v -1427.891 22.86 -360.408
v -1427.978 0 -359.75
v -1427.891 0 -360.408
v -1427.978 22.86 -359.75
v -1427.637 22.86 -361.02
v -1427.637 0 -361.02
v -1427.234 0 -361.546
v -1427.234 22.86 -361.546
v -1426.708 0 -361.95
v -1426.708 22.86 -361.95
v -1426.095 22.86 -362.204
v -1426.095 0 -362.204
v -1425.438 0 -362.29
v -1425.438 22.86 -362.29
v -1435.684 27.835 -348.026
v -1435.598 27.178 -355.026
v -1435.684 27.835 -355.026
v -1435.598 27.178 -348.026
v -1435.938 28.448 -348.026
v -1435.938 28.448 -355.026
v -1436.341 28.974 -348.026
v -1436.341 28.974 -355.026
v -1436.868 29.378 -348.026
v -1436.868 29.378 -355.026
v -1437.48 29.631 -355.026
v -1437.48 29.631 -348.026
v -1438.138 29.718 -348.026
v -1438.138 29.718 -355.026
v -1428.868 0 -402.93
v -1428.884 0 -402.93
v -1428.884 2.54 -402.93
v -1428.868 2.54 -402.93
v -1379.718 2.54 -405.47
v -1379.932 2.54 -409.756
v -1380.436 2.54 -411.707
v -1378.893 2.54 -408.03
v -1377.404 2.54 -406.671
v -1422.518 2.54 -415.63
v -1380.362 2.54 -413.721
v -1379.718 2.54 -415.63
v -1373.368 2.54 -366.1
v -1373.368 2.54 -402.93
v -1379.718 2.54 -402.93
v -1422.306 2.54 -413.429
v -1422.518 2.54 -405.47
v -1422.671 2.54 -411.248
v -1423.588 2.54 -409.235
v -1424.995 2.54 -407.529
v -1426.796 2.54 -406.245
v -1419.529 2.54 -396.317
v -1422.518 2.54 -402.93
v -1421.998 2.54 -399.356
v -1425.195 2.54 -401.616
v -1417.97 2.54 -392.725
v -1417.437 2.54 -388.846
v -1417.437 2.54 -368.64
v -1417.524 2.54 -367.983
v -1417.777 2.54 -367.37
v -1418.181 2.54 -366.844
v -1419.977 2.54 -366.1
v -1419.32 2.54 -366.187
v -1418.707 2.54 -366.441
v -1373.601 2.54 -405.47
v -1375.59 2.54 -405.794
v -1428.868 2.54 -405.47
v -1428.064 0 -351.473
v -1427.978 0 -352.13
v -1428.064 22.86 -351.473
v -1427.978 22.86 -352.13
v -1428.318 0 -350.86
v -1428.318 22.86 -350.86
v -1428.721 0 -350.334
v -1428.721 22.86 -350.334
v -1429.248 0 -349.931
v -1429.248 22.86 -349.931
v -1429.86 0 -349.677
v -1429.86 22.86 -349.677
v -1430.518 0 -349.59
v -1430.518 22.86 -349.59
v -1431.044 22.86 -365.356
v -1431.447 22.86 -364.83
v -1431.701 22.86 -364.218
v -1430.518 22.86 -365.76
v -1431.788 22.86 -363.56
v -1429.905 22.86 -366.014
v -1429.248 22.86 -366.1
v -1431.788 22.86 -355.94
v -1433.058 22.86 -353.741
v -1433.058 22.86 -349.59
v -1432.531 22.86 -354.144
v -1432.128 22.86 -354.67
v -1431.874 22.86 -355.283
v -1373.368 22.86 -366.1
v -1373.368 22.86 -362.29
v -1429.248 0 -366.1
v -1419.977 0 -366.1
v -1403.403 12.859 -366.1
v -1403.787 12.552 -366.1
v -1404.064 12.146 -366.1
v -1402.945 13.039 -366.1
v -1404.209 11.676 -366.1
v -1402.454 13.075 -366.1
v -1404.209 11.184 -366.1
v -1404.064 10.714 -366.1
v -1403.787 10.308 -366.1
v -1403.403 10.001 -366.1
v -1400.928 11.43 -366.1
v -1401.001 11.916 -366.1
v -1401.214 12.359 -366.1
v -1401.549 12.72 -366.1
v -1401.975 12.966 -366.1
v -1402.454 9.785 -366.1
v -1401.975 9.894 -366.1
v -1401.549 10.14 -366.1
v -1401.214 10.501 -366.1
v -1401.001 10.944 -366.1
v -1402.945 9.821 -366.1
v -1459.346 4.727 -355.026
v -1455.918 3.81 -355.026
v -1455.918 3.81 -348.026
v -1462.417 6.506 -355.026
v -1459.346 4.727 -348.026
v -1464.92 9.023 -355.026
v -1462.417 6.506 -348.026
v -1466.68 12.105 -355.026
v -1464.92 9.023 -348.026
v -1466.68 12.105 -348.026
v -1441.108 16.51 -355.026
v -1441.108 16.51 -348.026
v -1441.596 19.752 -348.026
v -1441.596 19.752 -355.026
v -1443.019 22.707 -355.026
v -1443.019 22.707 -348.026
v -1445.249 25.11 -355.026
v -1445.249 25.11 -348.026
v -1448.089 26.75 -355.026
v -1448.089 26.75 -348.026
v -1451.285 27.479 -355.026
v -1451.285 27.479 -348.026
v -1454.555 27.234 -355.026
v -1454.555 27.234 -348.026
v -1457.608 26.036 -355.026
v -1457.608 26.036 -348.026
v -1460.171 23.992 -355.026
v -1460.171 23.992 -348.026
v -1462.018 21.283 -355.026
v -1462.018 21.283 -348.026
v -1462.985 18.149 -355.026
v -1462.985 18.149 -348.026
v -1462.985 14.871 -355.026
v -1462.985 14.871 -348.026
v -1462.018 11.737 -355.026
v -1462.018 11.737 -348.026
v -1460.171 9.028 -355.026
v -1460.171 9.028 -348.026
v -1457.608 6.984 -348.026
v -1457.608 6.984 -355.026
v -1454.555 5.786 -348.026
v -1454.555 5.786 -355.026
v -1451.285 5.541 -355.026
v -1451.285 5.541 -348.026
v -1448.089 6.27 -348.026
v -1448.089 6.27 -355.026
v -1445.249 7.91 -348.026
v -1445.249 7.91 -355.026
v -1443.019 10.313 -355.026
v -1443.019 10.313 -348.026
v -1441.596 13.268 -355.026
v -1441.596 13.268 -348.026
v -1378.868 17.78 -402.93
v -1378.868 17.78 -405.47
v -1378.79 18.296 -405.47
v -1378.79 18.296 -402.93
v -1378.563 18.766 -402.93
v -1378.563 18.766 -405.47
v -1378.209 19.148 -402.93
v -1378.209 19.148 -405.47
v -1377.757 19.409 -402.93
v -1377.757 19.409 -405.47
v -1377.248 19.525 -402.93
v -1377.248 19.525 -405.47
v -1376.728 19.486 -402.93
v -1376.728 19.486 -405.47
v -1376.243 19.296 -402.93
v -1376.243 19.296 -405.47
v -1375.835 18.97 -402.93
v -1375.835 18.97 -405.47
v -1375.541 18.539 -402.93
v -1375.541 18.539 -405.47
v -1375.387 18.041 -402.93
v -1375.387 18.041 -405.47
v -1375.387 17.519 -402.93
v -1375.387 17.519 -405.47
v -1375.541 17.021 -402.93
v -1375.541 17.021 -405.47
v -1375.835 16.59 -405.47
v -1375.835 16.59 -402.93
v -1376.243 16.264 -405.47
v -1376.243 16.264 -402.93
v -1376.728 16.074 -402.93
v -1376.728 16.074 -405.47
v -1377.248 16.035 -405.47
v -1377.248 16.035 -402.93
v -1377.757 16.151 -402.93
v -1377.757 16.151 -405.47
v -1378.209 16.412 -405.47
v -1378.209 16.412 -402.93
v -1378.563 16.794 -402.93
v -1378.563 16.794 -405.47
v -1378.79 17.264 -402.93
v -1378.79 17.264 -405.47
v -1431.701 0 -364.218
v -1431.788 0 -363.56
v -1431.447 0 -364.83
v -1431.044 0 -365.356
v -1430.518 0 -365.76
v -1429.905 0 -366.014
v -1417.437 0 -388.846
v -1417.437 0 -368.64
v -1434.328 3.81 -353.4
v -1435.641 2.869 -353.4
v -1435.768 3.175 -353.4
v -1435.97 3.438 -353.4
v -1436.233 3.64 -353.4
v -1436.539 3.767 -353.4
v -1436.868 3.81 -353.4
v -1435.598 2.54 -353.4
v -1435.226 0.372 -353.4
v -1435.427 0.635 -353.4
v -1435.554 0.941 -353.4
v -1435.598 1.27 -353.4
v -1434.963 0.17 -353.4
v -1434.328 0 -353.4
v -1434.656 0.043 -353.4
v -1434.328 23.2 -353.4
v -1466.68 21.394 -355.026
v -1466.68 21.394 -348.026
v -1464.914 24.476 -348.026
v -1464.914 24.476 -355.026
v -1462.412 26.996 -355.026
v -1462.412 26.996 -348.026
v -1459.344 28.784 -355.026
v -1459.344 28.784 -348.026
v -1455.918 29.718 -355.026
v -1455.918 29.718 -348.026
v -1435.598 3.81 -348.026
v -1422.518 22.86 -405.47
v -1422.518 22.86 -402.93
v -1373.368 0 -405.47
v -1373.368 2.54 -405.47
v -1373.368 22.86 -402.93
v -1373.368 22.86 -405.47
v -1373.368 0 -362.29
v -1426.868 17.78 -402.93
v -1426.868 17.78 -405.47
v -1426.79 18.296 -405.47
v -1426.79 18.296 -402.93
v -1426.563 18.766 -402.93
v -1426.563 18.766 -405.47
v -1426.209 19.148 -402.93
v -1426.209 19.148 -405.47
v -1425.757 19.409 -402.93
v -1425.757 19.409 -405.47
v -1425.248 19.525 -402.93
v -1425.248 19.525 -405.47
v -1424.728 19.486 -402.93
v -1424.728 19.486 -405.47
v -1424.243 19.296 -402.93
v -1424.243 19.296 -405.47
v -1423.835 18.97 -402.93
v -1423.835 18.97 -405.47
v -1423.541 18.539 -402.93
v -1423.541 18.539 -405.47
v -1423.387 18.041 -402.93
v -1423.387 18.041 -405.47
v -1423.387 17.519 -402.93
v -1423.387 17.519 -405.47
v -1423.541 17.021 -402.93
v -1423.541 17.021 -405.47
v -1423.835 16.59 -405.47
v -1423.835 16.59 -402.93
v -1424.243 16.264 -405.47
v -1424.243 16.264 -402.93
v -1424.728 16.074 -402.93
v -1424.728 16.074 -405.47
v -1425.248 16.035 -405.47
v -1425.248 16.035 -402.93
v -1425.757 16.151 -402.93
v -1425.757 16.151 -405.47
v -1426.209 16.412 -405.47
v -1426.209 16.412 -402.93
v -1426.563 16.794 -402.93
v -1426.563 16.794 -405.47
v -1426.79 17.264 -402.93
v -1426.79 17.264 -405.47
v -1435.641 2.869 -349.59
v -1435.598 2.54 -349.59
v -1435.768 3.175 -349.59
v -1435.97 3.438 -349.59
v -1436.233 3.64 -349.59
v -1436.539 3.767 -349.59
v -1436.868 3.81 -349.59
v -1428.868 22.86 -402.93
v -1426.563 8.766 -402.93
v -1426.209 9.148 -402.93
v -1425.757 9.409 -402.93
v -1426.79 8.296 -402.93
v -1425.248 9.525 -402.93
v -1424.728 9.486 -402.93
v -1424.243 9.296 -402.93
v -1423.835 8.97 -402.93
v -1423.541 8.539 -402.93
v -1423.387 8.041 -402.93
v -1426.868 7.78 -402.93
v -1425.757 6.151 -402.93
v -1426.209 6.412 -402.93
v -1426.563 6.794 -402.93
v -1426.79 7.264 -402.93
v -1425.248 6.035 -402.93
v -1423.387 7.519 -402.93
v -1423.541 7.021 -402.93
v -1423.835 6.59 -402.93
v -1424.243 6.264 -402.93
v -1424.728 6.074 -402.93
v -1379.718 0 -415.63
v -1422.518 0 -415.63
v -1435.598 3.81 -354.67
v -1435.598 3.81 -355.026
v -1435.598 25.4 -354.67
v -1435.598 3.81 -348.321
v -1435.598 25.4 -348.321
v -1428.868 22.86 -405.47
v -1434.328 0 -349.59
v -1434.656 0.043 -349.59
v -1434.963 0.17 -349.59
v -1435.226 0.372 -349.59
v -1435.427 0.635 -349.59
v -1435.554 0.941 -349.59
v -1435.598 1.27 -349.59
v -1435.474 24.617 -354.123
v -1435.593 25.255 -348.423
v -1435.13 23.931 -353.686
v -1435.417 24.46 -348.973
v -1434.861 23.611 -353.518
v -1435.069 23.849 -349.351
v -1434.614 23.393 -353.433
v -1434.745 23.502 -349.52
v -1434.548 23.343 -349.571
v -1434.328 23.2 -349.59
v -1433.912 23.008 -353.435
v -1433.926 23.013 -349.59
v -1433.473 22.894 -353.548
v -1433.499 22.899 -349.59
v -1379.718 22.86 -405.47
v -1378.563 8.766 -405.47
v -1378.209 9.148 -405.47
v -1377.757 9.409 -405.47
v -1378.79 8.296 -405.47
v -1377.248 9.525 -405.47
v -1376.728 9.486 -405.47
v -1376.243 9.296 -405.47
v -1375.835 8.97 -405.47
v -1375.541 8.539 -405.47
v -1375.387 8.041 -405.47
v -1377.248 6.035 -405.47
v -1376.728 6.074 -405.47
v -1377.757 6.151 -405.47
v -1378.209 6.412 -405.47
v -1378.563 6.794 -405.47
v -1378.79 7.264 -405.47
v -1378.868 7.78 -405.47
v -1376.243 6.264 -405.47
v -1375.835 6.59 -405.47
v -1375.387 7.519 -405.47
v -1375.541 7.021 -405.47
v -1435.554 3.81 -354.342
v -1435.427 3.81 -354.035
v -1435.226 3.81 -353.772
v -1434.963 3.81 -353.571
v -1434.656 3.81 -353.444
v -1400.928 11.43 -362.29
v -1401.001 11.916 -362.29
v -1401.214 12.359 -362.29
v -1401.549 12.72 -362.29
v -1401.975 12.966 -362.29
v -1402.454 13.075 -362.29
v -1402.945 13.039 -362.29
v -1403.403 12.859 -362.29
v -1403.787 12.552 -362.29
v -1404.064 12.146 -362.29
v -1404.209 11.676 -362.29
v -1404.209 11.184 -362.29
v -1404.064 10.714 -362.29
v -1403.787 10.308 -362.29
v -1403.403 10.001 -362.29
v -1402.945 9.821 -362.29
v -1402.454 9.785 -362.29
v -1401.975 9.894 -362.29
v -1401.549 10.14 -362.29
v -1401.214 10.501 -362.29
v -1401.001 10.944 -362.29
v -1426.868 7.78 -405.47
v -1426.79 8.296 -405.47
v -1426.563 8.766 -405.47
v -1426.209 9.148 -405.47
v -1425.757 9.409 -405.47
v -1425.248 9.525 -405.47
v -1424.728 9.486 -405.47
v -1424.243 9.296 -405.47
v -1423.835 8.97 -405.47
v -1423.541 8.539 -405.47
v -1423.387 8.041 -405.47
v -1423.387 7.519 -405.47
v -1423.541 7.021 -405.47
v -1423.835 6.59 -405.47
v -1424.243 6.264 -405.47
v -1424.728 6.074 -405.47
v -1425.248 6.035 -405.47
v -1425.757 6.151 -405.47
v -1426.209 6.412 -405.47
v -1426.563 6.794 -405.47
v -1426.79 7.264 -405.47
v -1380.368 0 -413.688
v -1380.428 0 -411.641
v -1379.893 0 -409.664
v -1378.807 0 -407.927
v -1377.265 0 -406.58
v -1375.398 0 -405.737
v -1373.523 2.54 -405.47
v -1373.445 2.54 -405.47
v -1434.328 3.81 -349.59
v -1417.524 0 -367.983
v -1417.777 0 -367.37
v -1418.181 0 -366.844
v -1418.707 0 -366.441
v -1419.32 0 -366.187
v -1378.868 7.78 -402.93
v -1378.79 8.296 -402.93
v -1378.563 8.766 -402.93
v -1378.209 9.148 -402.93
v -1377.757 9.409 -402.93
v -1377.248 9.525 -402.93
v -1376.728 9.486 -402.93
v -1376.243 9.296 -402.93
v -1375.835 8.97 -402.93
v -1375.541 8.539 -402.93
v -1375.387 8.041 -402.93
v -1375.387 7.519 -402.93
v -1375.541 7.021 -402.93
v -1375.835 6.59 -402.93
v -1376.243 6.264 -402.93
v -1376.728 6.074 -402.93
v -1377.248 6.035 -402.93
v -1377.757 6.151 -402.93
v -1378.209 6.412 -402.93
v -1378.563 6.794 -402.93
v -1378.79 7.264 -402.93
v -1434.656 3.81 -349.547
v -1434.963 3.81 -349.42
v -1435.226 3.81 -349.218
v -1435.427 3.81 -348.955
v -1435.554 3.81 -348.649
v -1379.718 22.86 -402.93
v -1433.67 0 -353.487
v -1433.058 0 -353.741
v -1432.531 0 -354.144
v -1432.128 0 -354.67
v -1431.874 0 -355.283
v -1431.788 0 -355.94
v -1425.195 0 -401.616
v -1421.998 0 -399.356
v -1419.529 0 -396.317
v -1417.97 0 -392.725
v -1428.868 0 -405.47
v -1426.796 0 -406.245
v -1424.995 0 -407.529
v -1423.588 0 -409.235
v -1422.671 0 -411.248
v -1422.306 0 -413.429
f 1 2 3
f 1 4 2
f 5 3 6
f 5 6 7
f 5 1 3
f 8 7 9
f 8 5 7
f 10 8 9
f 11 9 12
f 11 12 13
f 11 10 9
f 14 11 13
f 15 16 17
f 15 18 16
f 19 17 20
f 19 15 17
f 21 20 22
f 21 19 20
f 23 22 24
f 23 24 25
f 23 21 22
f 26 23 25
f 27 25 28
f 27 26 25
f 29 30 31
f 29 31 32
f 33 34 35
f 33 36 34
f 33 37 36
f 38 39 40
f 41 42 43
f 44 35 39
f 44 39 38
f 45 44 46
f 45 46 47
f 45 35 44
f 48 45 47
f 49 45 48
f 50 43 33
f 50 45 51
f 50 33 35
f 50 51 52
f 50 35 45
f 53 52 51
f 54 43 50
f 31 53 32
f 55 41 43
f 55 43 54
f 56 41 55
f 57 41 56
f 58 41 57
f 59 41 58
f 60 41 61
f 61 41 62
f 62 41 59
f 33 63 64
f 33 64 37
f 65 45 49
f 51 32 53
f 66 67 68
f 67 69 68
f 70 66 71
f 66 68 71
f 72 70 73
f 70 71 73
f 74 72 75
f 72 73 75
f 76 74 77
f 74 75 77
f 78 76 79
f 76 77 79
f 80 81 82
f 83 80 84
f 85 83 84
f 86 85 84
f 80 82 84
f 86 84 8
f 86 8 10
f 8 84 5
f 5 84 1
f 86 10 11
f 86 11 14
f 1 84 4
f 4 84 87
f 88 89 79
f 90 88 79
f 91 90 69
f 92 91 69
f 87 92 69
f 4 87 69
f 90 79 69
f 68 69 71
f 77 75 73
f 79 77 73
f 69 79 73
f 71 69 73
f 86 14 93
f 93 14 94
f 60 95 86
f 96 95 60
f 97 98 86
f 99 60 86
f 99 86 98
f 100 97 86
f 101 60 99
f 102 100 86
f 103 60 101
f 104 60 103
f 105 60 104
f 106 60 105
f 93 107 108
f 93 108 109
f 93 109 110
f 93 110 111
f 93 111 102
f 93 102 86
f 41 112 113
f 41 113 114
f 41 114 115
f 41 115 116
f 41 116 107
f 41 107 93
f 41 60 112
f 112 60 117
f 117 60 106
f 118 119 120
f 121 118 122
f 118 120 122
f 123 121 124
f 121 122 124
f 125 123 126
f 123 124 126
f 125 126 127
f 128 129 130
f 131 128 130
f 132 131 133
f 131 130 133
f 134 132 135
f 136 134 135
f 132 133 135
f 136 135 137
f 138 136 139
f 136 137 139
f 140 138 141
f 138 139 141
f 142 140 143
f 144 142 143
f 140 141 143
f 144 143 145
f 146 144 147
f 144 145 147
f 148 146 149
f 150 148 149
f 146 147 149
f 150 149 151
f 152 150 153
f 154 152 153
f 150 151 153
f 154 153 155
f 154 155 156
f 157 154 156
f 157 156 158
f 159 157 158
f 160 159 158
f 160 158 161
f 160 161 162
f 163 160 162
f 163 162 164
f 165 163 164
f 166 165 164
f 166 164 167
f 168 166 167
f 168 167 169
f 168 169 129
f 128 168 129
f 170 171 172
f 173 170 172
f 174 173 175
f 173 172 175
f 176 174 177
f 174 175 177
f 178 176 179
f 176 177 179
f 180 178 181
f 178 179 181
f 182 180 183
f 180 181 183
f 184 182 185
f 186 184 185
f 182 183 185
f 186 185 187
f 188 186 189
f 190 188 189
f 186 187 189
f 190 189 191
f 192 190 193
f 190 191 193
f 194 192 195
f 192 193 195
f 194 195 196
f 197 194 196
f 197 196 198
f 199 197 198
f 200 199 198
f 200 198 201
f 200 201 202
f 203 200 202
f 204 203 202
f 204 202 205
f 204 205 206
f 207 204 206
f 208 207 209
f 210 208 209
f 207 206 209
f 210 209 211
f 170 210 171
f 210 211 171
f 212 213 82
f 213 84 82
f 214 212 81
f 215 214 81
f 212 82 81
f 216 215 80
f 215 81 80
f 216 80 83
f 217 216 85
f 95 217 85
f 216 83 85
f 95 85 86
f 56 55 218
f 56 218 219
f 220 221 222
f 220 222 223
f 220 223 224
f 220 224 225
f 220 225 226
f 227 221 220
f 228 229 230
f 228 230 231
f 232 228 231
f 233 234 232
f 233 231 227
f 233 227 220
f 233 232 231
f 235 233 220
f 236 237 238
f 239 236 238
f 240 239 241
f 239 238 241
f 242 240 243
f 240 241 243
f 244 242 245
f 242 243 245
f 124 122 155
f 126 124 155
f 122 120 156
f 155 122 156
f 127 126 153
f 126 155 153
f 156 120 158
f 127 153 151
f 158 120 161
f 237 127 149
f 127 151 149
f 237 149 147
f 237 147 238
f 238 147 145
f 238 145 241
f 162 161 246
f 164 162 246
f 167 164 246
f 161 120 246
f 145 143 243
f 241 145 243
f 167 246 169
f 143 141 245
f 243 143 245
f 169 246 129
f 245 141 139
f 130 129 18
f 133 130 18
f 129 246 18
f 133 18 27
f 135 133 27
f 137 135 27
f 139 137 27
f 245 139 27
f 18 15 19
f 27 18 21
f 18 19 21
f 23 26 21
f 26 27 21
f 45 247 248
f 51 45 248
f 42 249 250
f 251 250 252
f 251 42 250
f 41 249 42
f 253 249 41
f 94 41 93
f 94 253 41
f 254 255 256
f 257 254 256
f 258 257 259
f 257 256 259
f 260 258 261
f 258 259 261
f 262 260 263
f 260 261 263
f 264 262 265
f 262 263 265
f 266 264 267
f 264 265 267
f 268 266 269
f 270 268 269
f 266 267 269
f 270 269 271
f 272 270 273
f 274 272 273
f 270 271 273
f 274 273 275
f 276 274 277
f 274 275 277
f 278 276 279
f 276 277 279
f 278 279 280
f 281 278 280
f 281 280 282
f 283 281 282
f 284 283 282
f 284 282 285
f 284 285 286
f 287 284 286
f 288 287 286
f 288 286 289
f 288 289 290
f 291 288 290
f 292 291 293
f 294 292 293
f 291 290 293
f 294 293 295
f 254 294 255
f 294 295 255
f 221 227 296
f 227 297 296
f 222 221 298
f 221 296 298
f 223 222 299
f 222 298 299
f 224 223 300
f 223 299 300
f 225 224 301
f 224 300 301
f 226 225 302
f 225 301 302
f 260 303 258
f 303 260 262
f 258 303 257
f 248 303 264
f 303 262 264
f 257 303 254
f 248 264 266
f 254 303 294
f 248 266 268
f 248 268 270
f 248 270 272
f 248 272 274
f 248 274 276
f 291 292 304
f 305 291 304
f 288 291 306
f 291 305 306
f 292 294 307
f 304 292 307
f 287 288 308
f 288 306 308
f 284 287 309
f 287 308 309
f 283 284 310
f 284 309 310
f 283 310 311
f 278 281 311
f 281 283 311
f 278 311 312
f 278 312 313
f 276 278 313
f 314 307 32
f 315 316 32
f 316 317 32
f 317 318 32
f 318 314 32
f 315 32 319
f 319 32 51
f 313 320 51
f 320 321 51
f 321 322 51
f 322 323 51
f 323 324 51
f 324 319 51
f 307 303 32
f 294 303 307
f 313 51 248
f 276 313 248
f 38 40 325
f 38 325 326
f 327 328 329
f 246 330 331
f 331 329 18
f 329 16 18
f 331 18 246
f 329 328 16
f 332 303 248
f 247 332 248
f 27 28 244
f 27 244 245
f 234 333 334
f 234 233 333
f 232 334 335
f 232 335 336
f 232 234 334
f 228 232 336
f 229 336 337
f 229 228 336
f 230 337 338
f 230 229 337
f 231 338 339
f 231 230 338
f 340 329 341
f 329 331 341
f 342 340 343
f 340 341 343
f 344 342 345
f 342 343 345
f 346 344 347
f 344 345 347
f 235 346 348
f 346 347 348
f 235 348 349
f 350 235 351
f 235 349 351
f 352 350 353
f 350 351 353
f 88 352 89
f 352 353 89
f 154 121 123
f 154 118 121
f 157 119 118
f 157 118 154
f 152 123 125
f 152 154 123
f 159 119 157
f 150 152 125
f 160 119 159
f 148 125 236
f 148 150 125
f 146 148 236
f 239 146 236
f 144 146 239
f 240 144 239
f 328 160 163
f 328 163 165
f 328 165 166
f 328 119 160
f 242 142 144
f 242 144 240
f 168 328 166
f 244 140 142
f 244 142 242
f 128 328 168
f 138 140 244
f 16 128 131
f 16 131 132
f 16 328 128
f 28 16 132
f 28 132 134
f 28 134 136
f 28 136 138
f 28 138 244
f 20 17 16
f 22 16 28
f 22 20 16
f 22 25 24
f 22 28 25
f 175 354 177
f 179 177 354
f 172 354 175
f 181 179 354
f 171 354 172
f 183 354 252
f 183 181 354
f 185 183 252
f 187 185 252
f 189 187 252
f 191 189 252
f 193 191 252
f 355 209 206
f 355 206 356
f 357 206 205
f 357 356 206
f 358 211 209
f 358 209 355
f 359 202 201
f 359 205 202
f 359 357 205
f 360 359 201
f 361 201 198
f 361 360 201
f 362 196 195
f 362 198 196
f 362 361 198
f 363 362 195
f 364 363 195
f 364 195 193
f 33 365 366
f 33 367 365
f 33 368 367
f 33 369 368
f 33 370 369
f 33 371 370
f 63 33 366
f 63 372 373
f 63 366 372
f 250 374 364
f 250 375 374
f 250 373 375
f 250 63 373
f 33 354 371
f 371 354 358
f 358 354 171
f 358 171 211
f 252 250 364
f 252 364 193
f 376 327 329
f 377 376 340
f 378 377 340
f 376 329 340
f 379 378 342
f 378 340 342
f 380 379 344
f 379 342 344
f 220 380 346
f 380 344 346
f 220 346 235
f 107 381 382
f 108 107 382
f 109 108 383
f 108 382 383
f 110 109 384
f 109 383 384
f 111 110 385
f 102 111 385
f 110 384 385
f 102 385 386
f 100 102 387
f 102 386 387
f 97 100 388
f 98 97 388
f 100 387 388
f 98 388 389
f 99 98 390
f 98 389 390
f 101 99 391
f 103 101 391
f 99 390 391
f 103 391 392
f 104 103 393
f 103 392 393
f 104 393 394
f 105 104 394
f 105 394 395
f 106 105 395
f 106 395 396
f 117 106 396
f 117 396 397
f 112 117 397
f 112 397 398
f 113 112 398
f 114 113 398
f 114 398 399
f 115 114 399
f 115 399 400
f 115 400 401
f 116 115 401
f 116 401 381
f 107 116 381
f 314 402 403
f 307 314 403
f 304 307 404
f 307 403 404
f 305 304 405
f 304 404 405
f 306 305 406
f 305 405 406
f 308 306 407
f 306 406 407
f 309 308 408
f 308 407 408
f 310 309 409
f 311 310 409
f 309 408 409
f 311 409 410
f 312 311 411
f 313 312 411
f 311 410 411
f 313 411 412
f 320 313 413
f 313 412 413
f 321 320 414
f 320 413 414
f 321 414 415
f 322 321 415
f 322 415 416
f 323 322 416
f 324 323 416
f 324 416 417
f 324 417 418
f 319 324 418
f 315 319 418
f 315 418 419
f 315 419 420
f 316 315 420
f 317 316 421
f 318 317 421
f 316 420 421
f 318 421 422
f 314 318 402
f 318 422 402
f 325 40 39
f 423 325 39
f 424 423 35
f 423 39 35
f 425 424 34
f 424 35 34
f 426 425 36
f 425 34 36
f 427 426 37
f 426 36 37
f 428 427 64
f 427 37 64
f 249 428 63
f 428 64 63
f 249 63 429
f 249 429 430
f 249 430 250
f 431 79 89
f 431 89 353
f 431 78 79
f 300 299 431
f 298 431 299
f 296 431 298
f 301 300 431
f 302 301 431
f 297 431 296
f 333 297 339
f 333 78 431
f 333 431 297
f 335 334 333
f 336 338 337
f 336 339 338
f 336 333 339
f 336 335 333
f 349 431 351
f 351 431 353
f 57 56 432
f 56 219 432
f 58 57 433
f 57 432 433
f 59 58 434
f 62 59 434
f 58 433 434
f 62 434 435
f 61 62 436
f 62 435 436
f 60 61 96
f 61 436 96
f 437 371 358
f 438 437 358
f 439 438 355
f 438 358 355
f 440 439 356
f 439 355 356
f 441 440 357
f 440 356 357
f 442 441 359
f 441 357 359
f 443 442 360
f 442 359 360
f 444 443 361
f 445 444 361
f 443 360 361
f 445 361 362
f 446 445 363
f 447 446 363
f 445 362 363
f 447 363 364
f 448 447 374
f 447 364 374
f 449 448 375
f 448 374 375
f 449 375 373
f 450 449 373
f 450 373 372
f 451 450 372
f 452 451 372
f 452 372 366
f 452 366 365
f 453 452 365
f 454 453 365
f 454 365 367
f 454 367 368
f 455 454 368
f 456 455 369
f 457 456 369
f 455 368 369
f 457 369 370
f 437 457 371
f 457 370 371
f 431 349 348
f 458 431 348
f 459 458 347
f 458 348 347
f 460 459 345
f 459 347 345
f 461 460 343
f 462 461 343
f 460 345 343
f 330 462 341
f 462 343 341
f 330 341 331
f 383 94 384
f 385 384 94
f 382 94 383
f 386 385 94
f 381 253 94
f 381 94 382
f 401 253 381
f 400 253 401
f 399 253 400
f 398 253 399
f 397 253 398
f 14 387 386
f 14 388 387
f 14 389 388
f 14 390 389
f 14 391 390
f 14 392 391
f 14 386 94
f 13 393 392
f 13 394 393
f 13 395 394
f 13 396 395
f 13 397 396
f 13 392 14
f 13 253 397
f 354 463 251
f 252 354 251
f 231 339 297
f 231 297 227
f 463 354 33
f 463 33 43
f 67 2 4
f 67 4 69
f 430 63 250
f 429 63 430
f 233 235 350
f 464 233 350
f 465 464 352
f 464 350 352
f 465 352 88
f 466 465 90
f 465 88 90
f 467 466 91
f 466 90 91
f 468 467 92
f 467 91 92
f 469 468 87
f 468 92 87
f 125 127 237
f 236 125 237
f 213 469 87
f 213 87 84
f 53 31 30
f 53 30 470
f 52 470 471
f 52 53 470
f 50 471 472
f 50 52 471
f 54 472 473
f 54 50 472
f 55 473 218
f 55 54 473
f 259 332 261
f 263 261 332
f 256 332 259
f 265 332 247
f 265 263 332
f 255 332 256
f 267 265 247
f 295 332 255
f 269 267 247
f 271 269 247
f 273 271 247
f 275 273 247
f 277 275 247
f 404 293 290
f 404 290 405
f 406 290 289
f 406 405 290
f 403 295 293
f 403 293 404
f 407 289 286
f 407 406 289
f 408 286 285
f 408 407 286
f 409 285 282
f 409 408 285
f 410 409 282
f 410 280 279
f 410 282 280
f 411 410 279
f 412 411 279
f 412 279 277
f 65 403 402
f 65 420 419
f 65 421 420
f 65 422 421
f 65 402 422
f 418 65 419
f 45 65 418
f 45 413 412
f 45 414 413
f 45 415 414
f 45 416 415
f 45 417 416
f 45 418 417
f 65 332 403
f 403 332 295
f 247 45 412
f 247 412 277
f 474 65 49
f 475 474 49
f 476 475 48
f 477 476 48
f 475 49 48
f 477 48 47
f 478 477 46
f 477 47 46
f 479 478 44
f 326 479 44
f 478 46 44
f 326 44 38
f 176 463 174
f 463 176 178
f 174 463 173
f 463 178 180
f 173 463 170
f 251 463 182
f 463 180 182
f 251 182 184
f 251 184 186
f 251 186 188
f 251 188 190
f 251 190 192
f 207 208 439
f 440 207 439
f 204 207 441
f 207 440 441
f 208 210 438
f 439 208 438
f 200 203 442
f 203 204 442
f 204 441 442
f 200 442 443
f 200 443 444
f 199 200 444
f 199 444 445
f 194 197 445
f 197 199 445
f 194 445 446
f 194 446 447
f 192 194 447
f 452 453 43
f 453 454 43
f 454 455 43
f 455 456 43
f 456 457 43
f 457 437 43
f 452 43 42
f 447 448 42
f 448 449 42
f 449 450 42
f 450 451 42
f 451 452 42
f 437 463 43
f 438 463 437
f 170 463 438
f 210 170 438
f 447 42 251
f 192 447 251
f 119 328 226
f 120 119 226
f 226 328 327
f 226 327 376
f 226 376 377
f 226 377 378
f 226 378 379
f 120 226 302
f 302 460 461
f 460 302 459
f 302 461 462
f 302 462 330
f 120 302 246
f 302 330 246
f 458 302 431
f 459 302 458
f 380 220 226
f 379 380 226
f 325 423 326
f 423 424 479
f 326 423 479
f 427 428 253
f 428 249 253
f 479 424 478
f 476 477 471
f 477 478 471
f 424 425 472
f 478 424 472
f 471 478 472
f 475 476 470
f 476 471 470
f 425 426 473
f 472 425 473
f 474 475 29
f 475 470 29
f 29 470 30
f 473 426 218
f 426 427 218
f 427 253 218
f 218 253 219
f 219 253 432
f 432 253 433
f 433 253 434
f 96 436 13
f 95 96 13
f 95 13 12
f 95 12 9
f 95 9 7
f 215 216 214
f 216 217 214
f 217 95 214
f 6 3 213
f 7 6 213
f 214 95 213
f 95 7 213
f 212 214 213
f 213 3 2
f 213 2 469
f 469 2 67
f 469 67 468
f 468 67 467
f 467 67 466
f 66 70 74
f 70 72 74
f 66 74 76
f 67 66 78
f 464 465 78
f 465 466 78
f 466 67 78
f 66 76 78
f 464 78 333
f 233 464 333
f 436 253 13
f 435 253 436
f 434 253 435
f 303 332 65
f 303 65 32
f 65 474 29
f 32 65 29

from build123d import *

# Parameters (mm, degrees)
SKETCH2_W            = 55.515999966
SKETCH2_H            = 31.75
BOSS_EXTRUDE1_DEPTH  = 2.54
SKETCH4_W            = 6.35
SKETCH4_H            = 2.54
BOSS_EXTRUDE7_DEPTH  = 22.86
SKETCH29_W           = 55.515999966
SKETCH29_H           = 2.54
BOSS_EXTRUDE12_DEPTH = 5.08
SKETCH31_W           = 3.81
SKETCH31_H           = 8.89
BOSS_EXTRUDE13_DEPTH = 22.86
SKETCH32_W           = 7
SKETCH32_H           = 25.908
BOSS_EXTRUDE14_DEPTH = 31.75
SKETCH33_R           = 1.65
CUT_EXTRUDE5_DEPTH   = 9.144
SKETCH36_R           = 1.75
CUT_EXTRUDE7_DEPTH   = 2.54
SKETCH37_W           = 42.8
SKETCH37_H           = 2.54
BOSS_EXTRUDE15_DEPTH = 12.7
SKETCH38_W           = 55.5
SKETCH38_H           = 2.54
BOSS_EXTRUDE16_DEPTH = 6.35
CUT_EXTRUDE19_DEPTH  = 17.78
FILLET9_R            = 2.54
FILLET11_R           = 2.54
FILLET12_R           = 2.54
FILLET13_R           = 2.54
SKETCH47_R           = 11
CUT_EXTRUDE21_DEPTH  = 7.112
FILLET17_R           = 1.27
FILLET18_R           = 1.27
FILLET19_R           = 2.54
CUT_EXTRUDE24_DEPTH  = 7.62
SKETCH52_W           = 0.667345496
SKETCH52_H           = 9.289885036
CUT_EXTRUDE25_DEPTH  = 7.62


with BuildPart() as part:
    # Sketch2 → Boss-Extrude1 (new body)
    with BuildSketch(Plane(origin=(0, 0, 0), x_dir=(1, 0, 0), z_dir=(0, 1, 0))):
        with Locations((-1401.125525756, 387.055412371)):
            Rectangle(SKETCH2_W, SKETCH2_H)
    extrude(amount=BOSS_EXTRUDE1_DEPTH)

    # Sketch4 → Boss-Extrude7 (add)
    with BuildSketch(Plane.XZ):
        with Locations((-1376.542525773, -404.200412371)):
            Rectangle(SKETCH4_W, SKETCH4_H)
        with Locations((-1425.692525773, -404.200412371)):
            Rectangle(SKETCH4_W, SKETCH4_H)
    extrude(amount=-BOSS_EXTRUDE7_DEPTH)

    # Sketch29 → Boss-Extrude12 (add)
    with BuildSketch(Plane.XY.offset(-371.180412371)):
        with Locations((-1401.125525756, 1.27)):
            Rectangle(SKETCH29_W, SKETCH29_H)
    extrude(amount=BOSS_EXTRUDE12_DEPTH)

    # Sketch31 → Boss-Extrude13 (add)
    with BuildSketch(Plane.XZ):
        Polygon((-1428.883525739, -366.100412371), (-1373.367525773, -366.100412371), (-1373.367525773, -362.290412371), (-1427.977525773, -362.290412371), (-1431.787525773, -362.290412371), (-1431.787525773, -366.100412371), align=None)
        with Locations((-1429.882525773, -357.845412371)):
            Rectangle(SKETCH31_W, SKETCH31_H)
        Polygon((-1431.787525773, -353.400412371), (-1427.977525773, -353.400412371), (-1427.977525773, -349.590412371), (-1435.597525773, -349.590412371), (-1435.597525773, -353.400412371), align=None)
    extrude(amount=-BOSS_EXTRUDE13_DEPTH)

    # Sketch32 → Boss-Extrude14 (add)
    with BuildSketch(Plane.ZY.offset(1435.597525773)):
        with Locations((-351.526012371, 16.764)):
            Rectangle(SKETCH32_W, SKETCH32_H)
    extrude(amount=BOSS_EXTRUDE14_DEPTH)

    # Sketch33 → Cut-Extrude5 (cut)
    with BuildSketch(Plane.XY.offset(-362.290412371)):
        with Locations((-1402.577525773, 11.43)):
            Circle(SKETCH33_R)
    extrude(amount=-CUT_EXTRUDE5_DEPTH, mode=Mode.SUBTRACT)

    # Sketch36 → Cut-Extrude7 (cut)
    with BuildSketch(Plane(origin=(0, 0, -405.470412371), x_dir=(-1, 0, 0), z_dir=(0, 0, -1))):
        with Locations((1425.117525773, 17.78)):
            Circle(SKETCH36_R)
        with Locations((1425.117525773, 7.78)):
            Circle(SKETCH36_R)
        with Locations((1377.117525773, 17.78)):
            Circle(SKETCH36_R)
        with Locations((1377.117525773, 7.78)):
            Circle(SKETCH36_R)
    extrude(amount=-CUT_EXTRUDE7_DEPTH, mode=Mode.SUBTRACT)

    # Sketch37 → Boss-Extrude15 (add)
    with BuildSketch(Plane(origin=(0, 0, -402.930412371), x_dir=(-1, 0, 0), z_dir=(0, 0, -1))):
        with Locations((1401.117525773, 1.27)):
            Rectangle(SKETCH37_W, SKETCH37_H)
    extrude(amount=BOSS_EXTRUDE15_DEPTH)

    # Sketch38 → Boss-Extrude16 (add)
    with BuildSketch(Plane(origin=(0, 0, -405.470412371), x_dir=(-1, 0, 0), z_dir=(0, 0, -1))):
        with Locations((1401.117525773, 1.27)):
            Rectangle(SKETCH38_W, SKETCH38_H)
    extrude(amount=BOSS_EXTRUDE16_DEPTH)

    # Sketch46 → Cut-Extrude19 (cut)
    with BuildSketch(Plane(origin=(0, 2.54, 0), x_dir=(1, 0, 0), z_dir=(0, 1, 0))):
        with BuildLine():
            Line((-1422.517525773, 415.630412371), (-1428.867525773, 415.630412371))
            Line((-1428.867525773, 415.630412371), (-1428.867525773, 405.470412371))
            ThreePointArc((-1428.867525773, 405.470412371), (-1423.588320876, 409.235284311), (-1422.517525773, 415.630412371))
        make_face()
        with BuildLine():
            Line((-1417.437071461, 366.100412371), (-1428.883525739, 366.100412371))
            Line((-1428.883525739, 366.100412371), (-1428.883525739, 402.930412371))
            ThreePointArc((-1428.883525739, 402.930412371), (-1420.659545742, 397.92062476), (-1417.437071461, 388.846073619))
            Line((-1417.437071461, 388.846073619), (-1417.437071461, 366.100412371))
        make_face()
        with BuildLine():
            Line((-1373.367525773, 405.470412371), (-1373.367525773, 415.630412371))
            Line((-1373.367525773, 415.630412371), (-1379.717525773, 415.630412371))
            ThreePointArc((-1379.717525773, 415.630412371), (-1379.413786034, 408.755874708), (-1373.367525773, 405.470412371))
        make_face()
    extrude(amount=-CUT_EXTRUDE19_DEPTH, mode=Mode.SUBTRACT)

    # Fillet9
    fillet9_edges = [part.edges().sort_by_distance(p)[0] for p in [
        (-1417.437071461, 1.27, -366.100412371),
    ]]
    fillet(fillet9_edges, radius=FILLET9_R)

    # Fillet11
    fillet11_edges = [part.edges().sort_by_distance(p)[0] for p in [
        (-1431.787525773, 11.43, -353.400412371),
    ]]
    fillet(fillet11_edges, radius=FILLET11_R)

    # Fillet12
    fillet12_edges = [part.edges().sort_by_distance(p)[0] for p in [
        (-1427.977525773, 11.43, -362.290412371),
    ]]
    fillet(fillet12_edges, radius=FILLET12_R)

    # Fillet13
    fillet13_edges = [part.edges().sort_by_distance(p)[0] for p in [
        (-1431.787525773, 11.43, -366.100412371),
        (-1427.977525773, 11.43, -349.590412371),
    ]]
    fillet(fillet13_edges, radius=FILLET13_R)

    # Sketch47 → Cut-Extrude21 (cut)
    with BuildSketch(Plane.XY.offset(-348.026012371)):
        with Locations((-1452.107525773, 16.51)):
            Circle(SKETCH47_R)
    extrude(amount=-CUT_EXTRUDE21_DEPTH, mode=Mode.SUBTRACT)

    # Fillet17
    fillet17_edges = [part.edges().sort_by_distance(p)[0] for p in [
        (-1435.597525773, 3.81, -351.495412371),
        (-1435.597525773, 0, -351.495412371),
    ]]
    fillet(fillet17_edges, radius=FILLET17_R)

    # Fillet18
    fillet18_edges = [part.edges().sort_by_distance(p)[0] for p in [
        (-1435.597525773, 13.335, -353.400412371),
        (-1435.597525773, 13.335, -349.590412371),
    ]]
    fillet(fillet18_edges, radius=FILLET18_R - 0.0001)  # a hair under: the kernel refuses the full size

    # Fillet19
    fillet19_edges = [part.edges().sort_by_distance(p)[0] for p in [
        (-1435.597525773, 29.718, -351.526012371),
        (-1435.597525773, 22.86, -351.495412371),
    ]]
    fillet(fillet19_edges, radius=FILLET19_R)

    # Sketch51 → Cut-Extrude24 (cut)
    with BuildSketch(Plane.XY.offset(-348.026012371)):
        with BuildLine():
            Line((-1467.347525773, 29.718), (-1467.347525773, 19.304))
            ThreePointArc((-1467.347525773, 19.304), (-1463.253192632, 26.289780699), (-1455.917525773, 29.718))
            Line((-1455.917525773, 29.718), (-1467.347525773, 29.718))
        make_face()
        with BuildLine():
            ThreePointArc((-1455.917525773, 3.81), (-1463.26939399, 7.220437323), (-1467.347525773, 14.224))
            Line((-1467.347525773, 14.224), (-1467.347525773, 3.81))
            Line((-1467.347525773, 3.81), (-1455.917525773, 3.81))
        make_face()
    extrude(amount=-CUT_EXTRUDE24_DEPTH, mode=Mode.SUBTRACT)

    # Sketch52 → Cut-Extrude25 (cut)
    with BuildSketch(Plane.XY.offset(-348.026012371)):
        with Locations((-1467.013853025, 16.749471922)):
            Rectangle(SKETCH52_W, SKETCH52_H)
    extrude(amount=-CUT_EXTRUDE25_DEPTH, mode=Mode.SUBTRACT)


solid = part.part
